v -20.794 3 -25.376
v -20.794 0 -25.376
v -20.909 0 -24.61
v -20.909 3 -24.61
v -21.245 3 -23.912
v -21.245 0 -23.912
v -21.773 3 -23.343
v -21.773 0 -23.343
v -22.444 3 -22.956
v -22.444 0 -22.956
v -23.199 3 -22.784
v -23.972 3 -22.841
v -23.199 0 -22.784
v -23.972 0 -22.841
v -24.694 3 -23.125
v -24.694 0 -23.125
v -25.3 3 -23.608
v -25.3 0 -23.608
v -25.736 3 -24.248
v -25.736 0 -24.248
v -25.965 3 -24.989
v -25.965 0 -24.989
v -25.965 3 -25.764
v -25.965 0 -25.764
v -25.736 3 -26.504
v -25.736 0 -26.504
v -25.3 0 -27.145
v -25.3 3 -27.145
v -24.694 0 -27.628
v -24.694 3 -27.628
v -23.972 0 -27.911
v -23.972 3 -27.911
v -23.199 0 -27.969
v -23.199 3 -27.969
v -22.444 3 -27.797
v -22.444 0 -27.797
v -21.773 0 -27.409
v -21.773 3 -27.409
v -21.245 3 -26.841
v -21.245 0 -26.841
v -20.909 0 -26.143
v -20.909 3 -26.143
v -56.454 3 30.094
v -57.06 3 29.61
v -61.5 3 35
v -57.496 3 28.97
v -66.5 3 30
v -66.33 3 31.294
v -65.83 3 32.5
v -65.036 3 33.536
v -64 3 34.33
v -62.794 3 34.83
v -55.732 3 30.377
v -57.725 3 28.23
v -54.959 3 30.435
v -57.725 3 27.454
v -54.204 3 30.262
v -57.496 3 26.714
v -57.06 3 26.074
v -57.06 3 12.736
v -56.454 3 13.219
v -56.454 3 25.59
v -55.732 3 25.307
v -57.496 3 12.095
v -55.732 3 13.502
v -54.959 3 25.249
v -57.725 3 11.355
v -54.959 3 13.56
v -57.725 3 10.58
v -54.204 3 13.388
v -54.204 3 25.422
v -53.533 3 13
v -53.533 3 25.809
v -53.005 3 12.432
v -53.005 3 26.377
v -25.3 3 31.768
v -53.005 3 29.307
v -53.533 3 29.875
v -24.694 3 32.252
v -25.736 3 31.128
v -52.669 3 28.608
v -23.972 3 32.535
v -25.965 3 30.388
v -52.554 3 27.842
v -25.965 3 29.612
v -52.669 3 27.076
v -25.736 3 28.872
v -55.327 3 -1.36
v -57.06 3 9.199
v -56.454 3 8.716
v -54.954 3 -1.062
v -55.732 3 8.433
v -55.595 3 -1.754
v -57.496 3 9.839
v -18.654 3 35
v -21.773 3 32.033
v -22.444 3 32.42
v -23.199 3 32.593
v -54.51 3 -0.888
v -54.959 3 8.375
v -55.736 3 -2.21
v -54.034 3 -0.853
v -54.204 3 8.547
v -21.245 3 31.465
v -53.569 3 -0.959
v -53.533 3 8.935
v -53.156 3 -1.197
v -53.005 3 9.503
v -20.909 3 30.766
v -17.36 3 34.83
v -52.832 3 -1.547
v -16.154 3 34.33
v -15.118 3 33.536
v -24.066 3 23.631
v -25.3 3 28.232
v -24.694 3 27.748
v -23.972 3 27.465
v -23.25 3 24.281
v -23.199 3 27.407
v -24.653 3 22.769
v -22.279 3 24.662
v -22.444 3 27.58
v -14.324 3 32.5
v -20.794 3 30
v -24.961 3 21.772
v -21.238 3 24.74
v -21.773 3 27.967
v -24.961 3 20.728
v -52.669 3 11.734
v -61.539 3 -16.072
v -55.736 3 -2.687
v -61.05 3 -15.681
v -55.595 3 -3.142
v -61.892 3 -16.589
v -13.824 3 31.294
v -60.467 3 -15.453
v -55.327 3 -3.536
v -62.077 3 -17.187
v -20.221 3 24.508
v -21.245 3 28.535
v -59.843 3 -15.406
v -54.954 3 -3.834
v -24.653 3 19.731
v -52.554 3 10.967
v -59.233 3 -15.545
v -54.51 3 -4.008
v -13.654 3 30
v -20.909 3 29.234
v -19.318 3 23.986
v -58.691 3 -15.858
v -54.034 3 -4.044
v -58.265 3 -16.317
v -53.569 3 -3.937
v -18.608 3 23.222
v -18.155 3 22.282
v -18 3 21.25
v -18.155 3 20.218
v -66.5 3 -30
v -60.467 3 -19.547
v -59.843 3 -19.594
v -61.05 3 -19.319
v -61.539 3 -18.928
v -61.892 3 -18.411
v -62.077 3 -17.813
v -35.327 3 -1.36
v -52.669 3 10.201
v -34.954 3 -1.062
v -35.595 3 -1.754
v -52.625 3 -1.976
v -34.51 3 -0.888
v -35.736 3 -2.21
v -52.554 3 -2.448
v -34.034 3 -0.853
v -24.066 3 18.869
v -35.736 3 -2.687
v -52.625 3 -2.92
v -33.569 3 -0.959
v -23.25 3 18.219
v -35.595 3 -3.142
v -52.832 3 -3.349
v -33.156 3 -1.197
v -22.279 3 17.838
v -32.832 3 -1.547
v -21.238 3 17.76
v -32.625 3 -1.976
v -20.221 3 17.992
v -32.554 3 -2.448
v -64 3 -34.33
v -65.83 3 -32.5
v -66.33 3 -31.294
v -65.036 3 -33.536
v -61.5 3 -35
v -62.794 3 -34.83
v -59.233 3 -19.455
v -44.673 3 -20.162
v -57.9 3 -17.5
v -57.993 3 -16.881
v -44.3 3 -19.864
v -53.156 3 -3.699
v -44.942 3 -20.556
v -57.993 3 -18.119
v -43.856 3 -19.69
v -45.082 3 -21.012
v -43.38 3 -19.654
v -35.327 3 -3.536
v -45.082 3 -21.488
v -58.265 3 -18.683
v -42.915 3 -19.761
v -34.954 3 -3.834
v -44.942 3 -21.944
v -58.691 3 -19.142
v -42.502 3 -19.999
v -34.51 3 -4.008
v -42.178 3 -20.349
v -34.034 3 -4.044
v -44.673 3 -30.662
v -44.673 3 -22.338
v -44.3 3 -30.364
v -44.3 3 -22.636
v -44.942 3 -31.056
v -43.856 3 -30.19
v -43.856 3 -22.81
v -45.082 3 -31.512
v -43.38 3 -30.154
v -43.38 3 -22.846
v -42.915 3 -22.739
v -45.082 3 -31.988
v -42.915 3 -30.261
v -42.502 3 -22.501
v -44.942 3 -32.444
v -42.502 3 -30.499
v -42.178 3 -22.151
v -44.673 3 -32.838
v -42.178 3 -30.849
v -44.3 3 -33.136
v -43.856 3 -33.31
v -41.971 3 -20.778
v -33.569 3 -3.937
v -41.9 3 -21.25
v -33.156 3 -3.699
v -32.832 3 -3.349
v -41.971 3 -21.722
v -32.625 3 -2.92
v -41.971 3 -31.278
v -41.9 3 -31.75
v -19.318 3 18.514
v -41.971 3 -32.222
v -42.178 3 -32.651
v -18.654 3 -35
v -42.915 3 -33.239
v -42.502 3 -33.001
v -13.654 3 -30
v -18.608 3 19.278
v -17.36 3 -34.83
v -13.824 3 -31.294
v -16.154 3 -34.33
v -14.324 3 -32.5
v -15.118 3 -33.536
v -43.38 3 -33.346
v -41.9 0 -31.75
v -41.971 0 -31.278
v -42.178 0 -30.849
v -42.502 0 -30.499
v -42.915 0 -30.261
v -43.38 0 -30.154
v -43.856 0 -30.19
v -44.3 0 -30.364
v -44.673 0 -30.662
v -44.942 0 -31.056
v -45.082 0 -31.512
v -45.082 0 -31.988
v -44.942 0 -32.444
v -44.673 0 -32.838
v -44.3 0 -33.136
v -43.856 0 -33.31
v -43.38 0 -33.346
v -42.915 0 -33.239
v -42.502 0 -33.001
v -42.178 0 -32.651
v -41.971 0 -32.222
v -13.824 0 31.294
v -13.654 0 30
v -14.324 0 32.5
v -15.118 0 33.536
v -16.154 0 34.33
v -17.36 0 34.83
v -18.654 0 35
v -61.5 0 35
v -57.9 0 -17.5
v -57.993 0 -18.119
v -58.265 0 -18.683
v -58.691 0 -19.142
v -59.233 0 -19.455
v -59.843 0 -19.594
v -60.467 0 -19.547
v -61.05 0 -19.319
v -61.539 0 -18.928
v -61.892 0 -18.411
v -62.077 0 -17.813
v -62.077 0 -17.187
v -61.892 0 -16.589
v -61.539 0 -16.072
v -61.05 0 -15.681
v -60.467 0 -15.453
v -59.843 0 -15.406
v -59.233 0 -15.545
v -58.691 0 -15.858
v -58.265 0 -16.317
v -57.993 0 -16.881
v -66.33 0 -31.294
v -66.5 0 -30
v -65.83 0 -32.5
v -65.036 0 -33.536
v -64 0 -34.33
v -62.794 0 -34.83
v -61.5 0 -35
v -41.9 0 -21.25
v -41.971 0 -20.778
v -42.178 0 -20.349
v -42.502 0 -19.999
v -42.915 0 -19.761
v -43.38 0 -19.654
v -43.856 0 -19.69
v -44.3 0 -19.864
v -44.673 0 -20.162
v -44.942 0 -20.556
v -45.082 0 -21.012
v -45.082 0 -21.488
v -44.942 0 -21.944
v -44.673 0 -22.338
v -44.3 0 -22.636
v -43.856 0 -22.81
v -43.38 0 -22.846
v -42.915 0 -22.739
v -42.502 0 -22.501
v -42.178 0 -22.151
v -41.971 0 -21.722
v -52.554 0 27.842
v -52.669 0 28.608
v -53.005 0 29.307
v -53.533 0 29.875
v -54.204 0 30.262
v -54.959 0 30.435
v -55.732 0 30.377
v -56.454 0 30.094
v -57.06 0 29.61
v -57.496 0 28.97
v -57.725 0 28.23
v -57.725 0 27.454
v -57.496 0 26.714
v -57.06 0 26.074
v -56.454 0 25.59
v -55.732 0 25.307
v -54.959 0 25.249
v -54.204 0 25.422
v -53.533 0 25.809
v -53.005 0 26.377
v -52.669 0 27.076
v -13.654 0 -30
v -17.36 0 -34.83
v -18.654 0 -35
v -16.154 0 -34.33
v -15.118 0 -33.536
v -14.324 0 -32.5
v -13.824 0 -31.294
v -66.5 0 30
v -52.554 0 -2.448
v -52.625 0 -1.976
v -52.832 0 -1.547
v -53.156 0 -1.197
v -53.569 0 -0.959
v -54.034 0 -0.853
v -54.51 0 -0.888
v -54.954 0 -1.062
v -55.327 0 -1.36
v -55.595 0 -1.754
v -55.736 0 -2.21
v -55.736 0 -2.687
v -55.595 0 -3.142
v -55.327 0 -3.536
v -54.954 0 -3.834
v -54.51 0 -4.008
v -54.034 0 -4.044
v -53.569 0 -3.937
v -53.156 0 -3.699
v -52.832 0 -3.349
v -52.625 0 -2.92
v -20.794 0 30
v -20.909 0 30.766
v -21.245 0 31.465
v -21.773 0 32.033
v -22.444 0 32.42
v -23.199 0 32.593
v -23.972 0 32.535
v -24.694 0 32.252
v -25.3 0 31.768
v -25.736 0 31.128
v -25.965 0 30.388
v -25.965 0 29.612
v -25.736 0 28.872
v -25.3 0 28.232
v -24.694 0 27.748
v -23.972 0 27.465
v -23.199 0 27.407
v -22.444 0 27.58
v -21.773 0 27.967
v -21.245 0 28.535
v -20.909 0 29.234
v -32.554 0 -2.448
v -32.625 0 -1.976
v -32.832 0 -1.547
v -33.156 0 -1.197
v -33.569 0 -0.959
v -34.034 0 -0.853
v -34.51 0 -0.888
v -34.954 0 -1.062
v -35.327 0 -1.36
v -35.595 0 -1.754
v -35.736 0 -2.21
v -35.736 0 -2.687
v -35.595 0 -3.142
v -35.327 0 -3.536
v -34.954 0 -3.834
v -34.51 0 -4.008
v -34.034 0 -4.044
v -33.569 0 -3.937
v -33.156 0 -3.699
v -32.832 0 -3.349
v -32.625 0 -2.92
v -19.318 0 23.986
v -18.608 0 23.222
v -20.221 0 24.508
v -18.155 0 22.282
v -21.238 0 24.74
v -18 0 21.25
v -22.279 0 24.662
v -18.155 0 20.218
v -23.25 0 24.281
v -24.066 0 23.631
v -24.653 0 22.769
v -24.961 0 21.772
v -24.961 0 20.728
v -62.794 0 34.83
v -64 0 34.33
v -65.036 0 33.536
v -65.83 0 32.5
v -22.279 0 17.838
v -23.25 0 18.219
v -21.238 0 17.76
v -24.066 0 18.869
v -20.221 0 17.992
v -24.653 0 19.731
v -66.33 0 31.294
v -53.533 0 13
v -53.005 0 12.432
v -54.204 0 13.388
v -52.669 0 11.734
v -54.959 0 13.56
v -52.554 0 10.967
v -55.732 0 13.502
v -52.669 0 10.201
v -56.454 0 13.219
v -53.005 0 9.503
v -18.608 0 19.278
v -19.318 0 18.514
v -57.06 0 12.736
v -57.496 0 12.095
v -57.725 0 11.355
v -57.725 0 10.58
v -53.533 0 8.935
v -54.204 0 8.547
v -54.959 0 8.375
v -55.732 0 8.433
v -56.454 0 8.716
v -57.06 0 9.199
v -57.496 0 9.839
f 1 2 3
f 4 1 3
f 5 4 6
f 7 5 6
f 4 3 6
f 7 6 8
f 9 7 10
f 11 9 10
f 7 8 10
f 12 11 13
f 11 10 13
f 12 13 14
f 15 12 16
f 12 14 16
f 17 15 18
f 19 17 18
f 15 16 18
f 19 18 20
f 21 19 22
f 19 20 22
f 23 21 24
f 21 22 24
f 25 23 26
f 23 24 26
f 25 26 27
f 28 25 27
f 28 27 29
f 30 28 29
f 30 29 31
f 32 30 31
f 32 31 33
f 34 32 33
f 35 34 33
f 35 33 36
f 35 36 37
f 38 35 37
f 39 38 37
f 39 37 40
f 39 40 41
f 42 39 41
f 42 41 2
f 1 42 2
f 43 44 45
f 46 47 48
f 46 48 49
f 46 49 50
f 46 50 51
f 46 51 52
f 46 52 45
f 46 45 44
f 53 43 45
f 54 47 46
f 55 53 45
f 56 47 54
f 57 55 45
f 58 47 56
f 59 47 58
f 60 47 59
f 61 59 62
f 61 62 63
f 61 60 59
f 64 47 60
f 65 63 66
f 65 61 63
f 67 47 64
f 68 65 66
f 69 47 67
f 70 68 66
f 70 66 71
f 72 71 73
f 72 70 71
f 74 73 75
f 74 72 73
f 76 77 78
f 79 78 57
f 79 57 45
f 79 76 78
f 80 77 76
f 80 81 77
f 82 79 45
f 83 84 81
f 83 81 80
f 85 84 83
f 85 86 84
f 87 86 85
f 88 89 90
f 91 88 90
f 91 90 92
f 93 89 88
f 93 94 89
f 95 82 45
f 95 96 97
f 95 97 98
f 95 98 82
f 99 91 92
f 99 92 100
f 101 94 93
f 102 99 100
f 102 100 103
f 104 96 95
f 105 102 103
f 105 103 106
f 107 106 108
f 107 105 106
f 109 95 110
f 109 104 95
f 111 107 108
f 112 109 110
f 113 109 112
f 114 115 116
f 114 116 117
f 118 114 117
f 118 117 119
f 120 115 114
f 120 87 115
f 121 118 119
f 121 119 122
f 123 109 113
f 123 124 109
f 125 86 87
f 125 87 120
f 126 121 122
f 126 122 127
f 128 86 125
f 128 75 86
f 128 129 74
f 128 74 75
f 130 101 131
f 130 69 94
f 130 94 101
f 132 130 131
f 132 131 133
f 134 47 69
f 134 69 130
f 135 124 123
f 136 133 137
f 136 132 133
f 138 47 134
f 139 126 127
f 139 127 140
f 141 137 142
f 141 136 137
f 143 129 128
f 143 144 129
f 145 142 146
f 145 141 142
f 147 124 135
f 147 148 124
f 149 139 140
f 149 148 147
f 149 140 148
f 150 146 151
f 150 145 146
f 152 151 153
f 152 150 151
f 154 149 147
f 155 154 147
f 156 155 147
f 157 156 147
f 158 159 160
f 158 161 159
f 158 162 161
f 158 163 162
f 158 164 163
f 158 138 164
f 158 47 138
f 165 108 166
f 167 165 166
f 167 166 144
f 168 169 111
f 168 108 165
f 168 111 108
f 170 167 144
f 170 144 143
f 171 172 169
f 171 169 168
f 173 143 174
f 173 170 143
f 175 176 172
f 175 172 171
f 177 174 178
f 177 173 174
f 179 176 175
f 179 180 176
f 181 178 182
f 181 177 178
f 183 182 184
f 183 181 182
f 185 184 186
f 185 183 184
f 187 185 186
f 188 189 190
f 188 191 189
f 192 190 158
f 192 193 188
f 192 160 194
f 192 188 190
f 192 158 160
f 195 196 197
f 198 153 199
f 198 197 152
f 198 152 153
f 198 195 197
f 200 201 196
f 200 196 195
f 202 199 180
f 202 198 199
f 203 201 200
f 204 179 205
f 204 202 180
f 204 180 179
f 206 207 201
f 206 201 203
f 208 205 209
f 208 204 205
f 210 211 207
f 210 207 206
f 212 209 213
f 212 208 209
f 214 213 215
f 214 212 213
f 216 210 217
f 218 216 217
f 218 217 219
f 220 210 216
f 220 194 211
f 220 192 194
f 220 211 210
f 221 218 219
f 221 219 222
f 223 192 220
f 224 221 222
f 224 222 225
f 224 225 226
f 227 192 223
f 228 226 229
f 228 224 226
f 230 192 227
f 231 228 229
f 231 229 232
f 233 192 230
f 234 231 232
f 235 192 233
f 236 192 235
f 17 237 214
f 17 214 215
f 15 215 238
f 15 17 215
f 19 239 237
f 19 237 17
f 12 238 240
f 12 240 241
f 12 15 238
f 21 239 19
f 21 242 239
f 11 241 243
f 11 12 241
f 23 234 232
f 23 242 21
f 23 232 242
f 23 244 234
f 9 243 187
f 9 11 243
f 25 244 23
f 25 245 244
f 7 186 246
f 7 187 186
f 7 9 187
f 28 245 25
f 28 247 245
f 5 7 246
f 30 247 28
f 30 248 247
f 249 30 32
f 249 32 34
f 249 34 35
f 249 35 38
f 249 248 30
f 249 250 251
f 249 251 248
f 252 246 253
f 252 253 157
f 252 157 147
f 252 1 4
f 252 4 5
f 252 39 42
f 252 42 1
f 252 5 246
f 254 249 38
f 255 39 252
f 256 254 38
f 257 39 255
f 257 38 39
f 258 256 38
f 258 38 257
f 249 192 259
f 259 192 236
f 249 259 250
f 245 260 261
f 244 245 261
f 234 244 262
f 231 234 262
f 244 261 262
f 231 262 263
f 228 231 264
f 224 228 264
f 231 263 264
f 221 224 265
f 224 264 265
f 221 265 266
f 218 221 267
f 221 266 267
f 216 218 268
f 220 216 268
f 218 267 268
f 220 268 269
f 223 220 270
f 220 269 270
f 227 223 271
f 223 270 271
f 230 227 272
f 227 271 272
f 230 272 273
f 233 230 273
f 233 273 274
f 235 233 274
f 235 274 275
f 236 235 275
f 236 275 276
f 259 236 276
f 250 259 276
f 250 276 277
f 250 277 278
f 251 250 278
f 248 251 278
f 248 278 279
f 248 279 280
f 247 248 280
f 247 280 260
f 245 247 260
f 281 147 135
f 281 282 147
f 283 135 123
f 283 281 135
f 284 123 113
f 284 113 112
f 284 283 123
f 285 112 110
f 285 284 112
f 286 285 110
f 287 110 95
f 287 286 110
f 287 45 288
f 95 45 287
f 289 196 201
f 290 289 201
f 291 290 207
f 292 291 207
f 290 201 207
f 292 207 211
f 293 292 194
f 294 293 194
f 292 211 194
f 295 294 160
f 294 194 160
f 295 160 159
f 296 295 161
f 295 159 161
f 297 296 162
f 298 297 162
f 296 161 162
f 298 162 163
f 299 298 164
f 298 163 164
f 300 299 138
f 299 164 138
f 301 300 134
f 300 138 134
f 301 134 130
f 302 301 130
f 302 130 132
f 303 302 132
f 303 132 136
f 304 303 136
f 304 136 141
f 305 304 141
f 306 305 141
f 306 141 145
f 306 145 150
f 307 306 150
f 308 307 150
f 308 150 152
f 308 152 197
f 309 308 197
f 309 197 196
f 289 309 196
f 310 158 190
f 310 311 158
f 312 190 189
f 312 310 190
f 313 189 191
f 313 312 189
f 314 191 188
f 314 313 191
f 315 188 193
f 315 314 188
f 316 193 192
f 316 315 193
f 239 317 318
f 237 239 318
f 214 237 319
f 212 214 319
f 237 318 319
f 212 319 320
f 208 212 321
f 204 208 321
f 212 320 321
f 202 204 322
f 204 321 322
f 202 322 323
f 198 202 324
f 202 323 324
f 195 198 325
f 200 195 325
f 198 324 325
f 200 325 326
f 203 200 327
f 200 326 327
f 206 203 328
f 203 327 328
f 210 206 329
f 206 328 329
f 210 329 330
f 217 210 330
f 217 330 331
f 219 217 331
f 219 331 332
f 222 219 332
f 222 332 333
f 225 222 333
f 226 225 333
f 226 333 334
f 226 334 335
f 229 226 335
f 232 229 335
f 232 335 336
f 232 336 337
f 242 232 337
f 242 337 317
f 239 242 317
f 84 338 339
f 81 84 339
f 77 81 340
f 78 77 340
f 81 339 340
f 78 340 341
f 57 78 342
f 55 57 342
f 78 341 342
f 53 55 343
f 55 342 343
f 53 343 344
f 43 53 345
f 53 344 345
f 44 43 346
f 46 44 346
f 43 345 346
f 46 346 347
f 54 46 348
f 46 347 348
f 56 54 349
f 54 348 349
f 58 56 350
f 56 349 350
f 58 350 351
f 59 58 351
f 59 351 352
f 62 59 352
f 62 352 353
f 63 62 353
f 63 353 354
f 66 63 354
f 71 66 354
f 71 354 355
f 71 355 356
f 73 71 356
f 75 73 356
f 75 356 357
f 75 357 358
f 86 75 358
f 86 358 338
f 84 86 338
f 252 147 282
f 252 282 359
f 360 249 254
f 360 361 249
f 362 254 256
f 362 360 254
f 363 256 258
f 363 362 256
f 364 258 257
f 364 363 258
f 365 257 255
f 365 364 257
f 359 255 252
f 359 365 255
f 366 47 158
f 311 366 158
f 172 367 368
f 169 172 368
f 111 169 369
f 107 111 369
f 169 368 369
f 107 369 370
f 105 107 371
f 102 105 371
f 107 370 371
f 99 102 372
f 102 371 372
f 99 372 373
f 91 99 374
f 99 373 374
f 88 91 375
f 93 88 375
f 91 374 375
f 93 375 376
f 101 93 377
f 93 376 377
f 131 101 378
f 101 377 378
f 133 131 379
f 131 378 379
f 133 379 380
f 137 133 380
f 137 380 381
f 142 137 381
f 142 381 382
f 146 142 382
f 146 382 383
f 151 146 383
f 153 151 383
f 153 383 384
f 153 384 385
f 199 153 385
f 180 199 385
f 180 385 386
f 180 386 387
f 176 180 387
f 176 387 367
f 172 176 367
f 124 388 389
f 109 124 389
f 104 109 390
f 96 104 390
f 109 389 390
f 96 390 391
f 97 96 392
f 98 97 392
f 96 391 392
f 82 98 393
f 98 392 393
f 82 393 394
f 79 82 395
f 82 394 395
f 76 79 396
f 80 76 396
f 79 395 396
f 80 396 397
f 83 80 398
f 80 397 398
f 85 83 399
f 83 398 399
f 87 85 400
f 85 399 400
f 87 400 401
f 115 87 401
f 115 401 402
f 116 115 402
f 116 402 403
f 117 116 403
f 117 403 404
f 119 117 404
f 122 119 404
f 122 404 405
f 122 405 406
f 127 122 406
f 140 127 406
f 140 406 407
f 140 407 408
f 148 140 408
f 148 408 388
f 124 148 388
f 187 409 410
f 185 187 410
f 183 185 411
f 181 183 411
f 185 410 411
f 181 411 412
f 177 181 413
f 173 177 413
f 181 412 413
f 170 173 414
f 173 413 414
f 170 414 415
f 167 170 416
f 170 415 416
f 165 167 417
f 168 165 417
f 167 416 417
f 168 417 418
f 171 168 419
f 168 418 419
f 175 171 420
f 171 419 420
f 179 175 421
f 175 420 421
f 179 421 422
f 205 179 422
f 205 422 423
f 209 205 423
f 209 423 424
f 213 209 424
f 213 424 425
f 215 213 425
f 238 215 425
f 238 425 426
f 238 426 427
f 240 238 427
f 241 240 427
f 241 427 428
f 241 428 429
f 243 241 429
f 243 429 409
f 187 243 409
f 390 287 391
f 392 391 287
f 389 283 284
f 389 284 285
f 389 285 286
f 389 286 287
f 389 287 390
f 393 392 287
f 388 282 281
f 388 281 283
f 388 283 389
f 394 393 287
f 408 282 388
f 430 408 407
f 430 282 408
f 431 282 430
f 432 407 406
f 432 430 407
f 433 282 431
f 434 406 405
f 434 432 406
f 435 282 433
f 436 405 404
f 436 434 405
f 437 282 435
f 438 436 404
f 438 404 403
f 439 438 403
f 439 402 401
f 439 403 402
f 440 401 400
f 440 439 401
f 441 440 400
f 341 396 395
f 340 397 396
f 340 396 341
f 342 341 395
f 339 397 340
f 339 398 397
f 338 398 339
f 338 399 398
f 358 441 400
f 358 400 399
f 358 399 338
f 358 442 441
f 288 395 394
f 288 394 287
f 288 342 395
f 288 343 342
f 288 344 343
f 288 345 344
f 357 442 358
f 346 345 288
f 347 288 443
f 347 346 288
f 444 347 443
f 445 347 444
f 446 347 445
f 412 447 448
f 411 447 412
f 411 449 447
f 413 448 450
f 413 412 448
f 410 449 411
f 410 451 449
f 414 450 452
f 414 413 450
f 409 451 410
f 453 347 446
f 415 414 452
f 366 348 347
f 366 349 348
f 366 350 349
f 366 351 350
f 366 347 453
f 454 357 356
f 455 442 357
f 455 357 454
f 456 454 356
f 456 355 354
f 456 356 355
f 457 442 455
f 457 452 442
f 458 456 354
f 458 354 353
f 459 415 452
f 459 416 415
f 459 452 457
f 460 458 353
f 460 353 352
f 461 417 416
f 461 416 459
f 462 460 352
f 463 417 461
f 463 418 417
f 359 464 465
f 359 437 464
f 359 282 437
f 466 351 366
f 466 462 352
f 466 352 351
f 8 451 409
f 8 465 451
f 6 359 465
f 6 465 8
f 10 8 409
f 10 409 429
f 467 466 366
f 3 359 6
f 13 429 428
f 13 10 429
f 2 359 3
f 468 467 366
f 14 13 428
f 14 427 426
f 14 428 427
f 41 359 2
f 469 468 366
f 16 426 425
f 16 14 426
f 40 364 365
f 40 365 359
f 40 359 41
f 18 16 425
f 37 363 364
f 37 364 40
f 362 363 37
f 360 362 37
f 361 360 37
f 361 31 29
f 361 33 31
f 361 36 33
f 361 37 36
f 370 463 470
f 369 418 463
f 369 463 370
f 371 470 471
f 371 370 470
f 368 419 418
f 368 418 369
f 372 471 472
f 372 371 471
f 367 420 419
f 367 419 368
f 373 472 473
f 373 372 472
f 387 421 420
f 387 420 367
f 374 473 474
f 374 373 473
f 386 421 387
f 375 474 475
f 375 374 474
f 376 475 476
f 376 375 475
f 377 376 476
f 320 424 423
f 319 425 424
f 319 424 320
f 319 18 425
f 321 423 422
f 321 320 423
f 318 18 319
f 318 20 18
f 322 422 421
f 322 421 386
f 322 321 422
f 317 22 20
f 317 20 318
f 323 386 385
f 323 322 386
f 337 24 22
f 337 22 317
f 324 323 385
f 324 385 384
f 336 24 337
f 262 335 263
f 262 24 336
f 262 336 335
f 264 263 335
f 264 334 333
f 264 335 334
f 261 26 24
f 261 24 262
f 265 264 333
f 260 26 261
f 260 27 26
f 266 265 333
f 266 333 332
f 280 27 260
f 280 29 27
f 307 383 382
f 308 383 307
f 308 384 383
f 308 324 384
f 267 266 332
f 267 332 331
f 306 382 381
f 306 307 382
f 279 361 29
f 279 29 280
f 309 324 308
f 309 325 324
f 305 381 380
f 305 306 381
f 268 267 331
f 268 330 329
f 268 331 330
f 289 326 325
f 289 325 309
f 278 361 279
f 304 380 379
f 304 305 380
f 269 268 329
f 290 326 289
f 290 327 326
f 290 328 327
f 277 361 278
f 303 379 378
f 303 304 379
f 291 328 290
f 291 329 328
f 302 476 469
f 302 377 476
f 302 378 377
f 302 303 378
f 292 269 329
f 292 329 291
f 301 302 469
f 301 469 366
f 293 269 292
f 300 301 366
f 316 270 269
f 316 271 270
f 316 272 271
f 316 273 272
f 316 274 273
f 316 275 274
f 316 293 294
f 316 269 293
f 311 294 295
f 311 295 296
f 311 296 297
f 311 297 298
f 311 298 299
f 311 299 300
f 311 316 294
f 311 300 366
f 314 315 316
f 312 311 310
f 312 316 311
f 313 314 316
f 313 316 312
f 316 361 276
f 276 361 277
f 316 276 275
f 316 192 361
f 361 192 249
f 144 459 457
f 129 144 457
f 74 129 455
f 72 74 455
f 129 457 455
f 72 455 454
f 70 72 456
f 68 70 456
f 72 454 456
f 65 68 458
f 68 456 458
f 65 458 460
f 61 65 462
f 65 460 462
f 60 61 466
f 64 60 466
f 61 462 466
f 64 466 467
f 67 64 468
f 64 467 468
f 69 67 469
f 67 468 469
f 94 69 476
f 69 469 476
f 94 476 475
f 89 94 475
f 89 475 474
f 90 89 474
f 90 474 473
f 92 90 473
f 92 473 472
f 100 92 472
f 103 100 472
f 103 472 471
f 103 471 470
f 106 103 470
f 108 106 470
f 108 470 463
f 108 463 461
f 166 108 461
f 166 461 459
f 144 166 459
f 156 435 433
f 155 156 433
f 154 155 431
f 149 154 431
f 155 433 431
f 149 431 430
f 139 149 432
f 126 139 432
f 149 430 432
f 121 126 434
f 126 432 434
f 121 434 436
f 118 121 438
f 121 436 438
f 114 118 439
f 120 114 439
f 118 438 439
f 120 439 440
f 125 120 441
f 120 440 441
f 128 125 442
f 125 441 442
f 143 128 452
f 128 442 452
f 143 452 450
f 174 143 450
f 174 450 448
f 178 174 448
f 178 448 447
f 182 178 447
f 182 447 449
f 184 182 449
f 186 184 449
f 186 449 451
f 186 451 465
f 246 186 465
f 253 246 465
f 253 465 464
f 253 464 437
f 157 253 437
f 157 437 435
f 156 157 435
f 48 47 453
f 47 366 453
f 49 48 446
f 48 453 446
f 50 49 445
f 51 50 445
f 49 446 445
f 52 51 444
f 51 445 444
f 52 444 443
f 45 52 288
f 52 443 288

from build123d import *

# Parameters (mm, degrees)
SKETCH_1_W             = 35
SKETCH_1_H             = 70
SKETCH_1_R             = 2.6
EXTRUDE_505_DEPTH      = 3
SKETCH_2_R             = 2.1
CUT_EXTRUDE_M4_DEPTH   = 3
SKETCH_3_R             = 2.6
EXTRUDE_967_DEPTH      = 3
SKETCH_4_R             = 2.1
CUT_EXTRUDE_1312_DEPTH = 4
SKETCH_5_W             = 49
SKETCH_5_H             = 70
EXTRA_DEPTH            = 3
SKETCH_6_R             = 2.1
CUT_EXTRUDE_2055_DEPTH = 10
SKETCH_7_R             = 2.1
ETRA_DEPTH             = 10
SKETCH_10_R            = 1.6
SKETCH_10_R_2          = 3.5
CUT_EXTRUDE_3548_DEPTH = 4
FILLET_5_0_R           = 5
SKETCH_12_R            = 2.1
EXTRUDE_1_DEPTH        = 3
SKETCH_13_R            = 1.5
CUT_EXTRUDE_1_DEPTH    = 4
SKETCH_15_W            = 32.658399477
SKETCH_15_H            = 70
CUT_EXTRUDE_4_DEPTH    = 4
FILLET_6_R             = 5
SKETCH_16_R            = 1.6
SKETCH_16_R_2          = 1.603432059
EXTRUDE_2_DEPTH        = 3
SKETCH_17_R            = 2.5
CUT_EXTRUDE_5_DEPTH    = 4
SKETCH_18_R            = 1.5
EXTRUDE_3_DEPTH        = 3
SKETCH_19_R            = 1.2
CUT_EXTRUDE_6_DEPTH    = 4
SKETCH_20_R            = 2.1
SKETCH_20_R_2          = 1.6
SKETCH_20_R_3          = 2.55820294
EXTRUDE_4_DEPTH        = 3
SKETCH_22_R            = 3.5
SKETCH_22_R_2          = 2.5
EXTRUDE_5_DEPTH        = 3
SKETCH_25_R            = 2.5
CUT_EXTRUDE_9_DEPTH    = 4
SKETCH_26_R            = 2.6
SKETCH_26_R_2          = 1.6
CUT_EXTRUDE_10_DEPTH   = 4


with BuildPart() as part:
    # 草图1 → Extrude 505 (new body)
    with BuildSketch(Plane(origin=(0, 0, 0), x_dir=(1, 0, 0), z_dir=(0, 1, 0))):
        Rectangle(SKETCH_1_W, SKETCH_1_H)
        with Locations((-7.5, 22.5)):
            Circle(SKETCH_1_R, mode=Mode.SUBTRACT)
        with Locations((-7.5, 0)):
            Circle(SKETCH_1_R, mode=Mode.SUBTRACT)
        with Locations((-7.5, -22.5)):
            Circle(SKETCH_1_R, mode=Mode.SUBTRACT)
        with Locations((-7.5, 10)):
            Circle(SKETCH_1_R, mode=Mode.SUBTRACT)
        with Locations((-7.5, -10)):
            Circle(SKETCH_1_R, mode=Mode.SUBTRACT)
    extrude(amount=EXTRUDE_505_DEPTH)

    # 草图2 → M4铝柱 (cut)
    with BuildSketch(Plane(origin=(0, 3, 0), x_dir=(1, 0, 0), z_dir=(0, 1, 0))):
        with Locations((10, 0)):
            Circle(SKETCH_2_R)
    extrude(amount=-CUT_EXTRUDE_M4_DEPTH, mode=Mode.SUBTRACT)

    # 草图3 → Extrude 967 (add, through all)
    with BuildSketch(Plane(origin=(0, 3, 0), x_dir=(1, 0, 0), z_dir=(0, 1, 0))):
        with Locations((-7.5, -10)):
            Circle(SKETCH_3_R)
        with Locations((-7.5, 10)):
            Circle(SKETCH_3_R)
    extrude(amount=-EXTRUDE_967_DEPTH)

    # 草图4 → Cut-Extrude 1312 (cut, through all)
    with BuildSketch(Plane(origin=(0, 3, 0), x_dir=(1, 0, 0), z_dir=(0, 1, 0))):
        with Locations((10, 22.5)):
            Circle(SKETCH_4_R)
        with Locations((10, -22.5)):
            Circle(SKETCH_4_R)
    extrude(amount=-CUT_EXTRUDE_1312_DEPTH, mode=Mode.SUBTRACT)

    # 草图5 → EXTRA (add, through all)
    with BuildSketch(Plane(origin=(0, 3, 0), x_dir=(1, 0, 0), z_dir=(0, 1, 0))):
        with Locations((-42, 0)):
            Rectangle(SKETCH_5_W, SKETCH_5_H)
    extrude(amount=-EXTRA_DEPTH)

    # 草图6 → Cut-Extrude 2055 (cut)
    with BuildSketch(Plane(origin=(0, 3, 0), x_dir=(1, 0, 0), z_dir=(0, 1, 0))):
        with Locations((-44.5, 0)):
            Circle(SKETCH_6_R)
        with Locations((-36.5, 0)):
            Circle(SKETCH_6_R)
    extrude(amount=-CUT_EXTRUDE_2055_DEPTH, mode=Mode.SUBTRACT)

    # 草图7 → ETRA铝柱 (cut)
    with BuildSketch(Plane(origin=(0, 3, 0), x_dir=(1, 0, 0), z_dir=(0, 1, 0))):
        with Locations((-60, 17.5)):
            Circle(SKETCH_7_R)
        with Locations((-60, -17.5)):
            Circle(SKETCH_7_R)
    extrude(amount=-ETRA_DEPTH, mode=Mode.SUBTRACT)

    # 草图10 → Cut-Extrude 3548 (cut, through all)
    with BuildSketch(Plane.XZ):
        with Locations((-43.5, -21.25)):
            Circle(SKETCH_10_R)
        with Locations((-21.5, -31.75)):
            Circle(SKETCH_10_R)
        with Locations((-43.5, -31.75)):
            Circle(SKETCH_10_R)
        with Locations((-43.5, 21.25)):
            Circle(SKETCH_10_R)
        with Locations((-21.5, 31.75)):
            Circle(SKETCH_10_R)
        with Locations((-43.5, 31.75)):
            Circle(SKETCH_10_R)
        with Locations((-21.5, 21.25)):
            Circle(SKETCH_10_R_2)
        with Locations((-21.5, -21.25)):
            Circle(SKETCH_10_R_2)
    extrude(amount=-CUT_EXTRUDE_3548_DEPTH, mode=Mode.SUBTRACT)

    # 圆角5.0
    fillet_5_0_edges = [part.edges().sort_by_distance(p)[0] for p in [
        (-66.5, 1.5, 35),
        (-66.5, 1.5, -35),
        (17.5, 1.5, 35),
        (17.5, 1.5, -35),
    ]]
    fillet(fillet_5_0_edges, radius=FILLET_5_0_R)

    # 草图12 → 凸台-拉伸1 (add)
    with BuildSketch(Plane(origin=(0, 3, 0), x_dir=(1, 0, 0), z_dir=(0, 1, 0))):
        with Locations((-36.5, 0)):
            Circle(SKETCH_12_R)
        with Locations((-44.5, 0)):
            Circle(SKETCH_12_R)
    extrude(amount=-EXTRUDE_1_DEPTH)

    # 草图13 → 切除-拉伸1 (cut, through all)
    with BuildSketch(Plane(origin=(0, 3, 0), x_dir=(1, 0, 0), z_dir=(0, 1, 0))):
        with Locations((-52.499999555, 1.426e-06)):
            Circle(SKETCH_13_R)
        with Locations((-28.499999555, 1.44e-06)):
            Circle(SKETCH_13_R)
    extrude(amount=-CUT_EXTRUDE_1_DEPTH, mode=Mode.SUBTRACT)

    # 草图15 → 切除-拉伸4 (cut, through all)
    with BuildSketch(Plane(origin=(0, 3, 0), x_dir=(1, 0, 0), z_dir=(0, 1, 0))):
        with Locations((2.675548589, 0)):
            Rectangle(SKETCH_15_W, SKETCH_15_H)
    extrude(amount=-CUT_EXTRUDE_4_DEPTH, mode=Mode.SUBTRACT)

    # 圆角6
    fillet_6_edges = [part.edges().sort_by_distance(p)[0] for p in [
        (-13.653651149, 1.5, -35),
        (-13.653651149, 1.5, 35),
    ]]
    fillet(fillet_6_edges, radius=FILLET_6_R)

    # 草图16 → 凸台-拉伸2 (add)
    with BuildSketch(Plane.XZ):
        with Locations((-21.5, 31.75)):
            Circle(SKETCH_16_R)
        with Locations((-21.5, -31.75)):
            Circle(SKETCH_16_R_2)
    extrude(amount=-EXTRUDE_2_DEPTH)

    # 草图17 → 切除-拉伸5 (cut, through all)
    with BuildSketch(Plane(origin=(0, 3, 0), x_dir=(1, 0, 0), z_dir=(0, 1, 0))):
        with Locations((-23.393651149, -30)):
            Circle(SKETCH_17_R)
        with Locations((-24.763651149, 30)):
            Circle(SKETCH_17_R)
    extrude(amount=-CUT_EXTRUDE_5_DEPTH, mode=Mode.SUBTRACT)

    # 草图18 → 凸台-拉伸3 (add)
    with BuildSketch(Plane.XZ):
        with Locations((-52.499999555, -1.426e-06)):
            Circle(SKETCH_18_R)
        with Locations((-28.499999555, -1.44e-06)):
            Circle(SKETCH_18_R)
    extrude(amount=-EXTRUDE_3_DEPTH)

    # 草图19 → 切除-拉伸6 (cut, through all)
    with BuildSketch(Plane.XZ):
        with Locations((-54.153651149, -2.448052536)):
            Circle(SKETCH_19_R)
        with Locations((-34.153651149, -2.448052536)):
            Circle(SKETCH_19_R)
    extrude(amount=-CUT_EXTRUDE_6_DEPTH, mode=Mode.SUBTRACT)

    # 草图20 → 凸台-拉伸4 (add)
    with BuildSketch(Plane.XZ):
        with Locations((-60, 17.5)):
            Circle(SKETCH_20_R)
        with Locations((-43.5, 21.25)):
            Circle(SKETCH_20_R_2)
        with Locations((-43.653651149, 31.685692809)):
            Circle(SKETCH_20_R_3)
    extrude(amount=-EXTRUDE_4_DEPTH)

    # 草图22 → 凸台-拉伸5 (add)
    with BuildSketch(Plane(origin=(0, 0, 0), x_dir=(-1, 0, 0), z_dir=(0, -1, 0))):
        with Locations((21.5, 21.25)):
            Circle(SKETCH_22_R)
        with Locations((24.763651149, 30)):
            Circle(SKETCH_22_R_2)
    extrude(amount=-EXTRUDE_5_DEPTH)

    # 草图25 → 切除-拉伸9 (cut, through all)
    with BuildSketch(Plane(origin=(0, 3, 0), x_dir=(1, 0, 0), z_dir=(0, 1, 0))):
        with Locations((-23.393651149, 25.376236088)):
            Circle(SKETCH_25_R)
    extrude(amount=-CUT_EXTRUDE_9_DEPTH, mode=Mode.SUBTRACT)

    # 草图26 → 切除-拉伸10 (cut, through all)
    with BuildSketch(Plane.XZ):
        with Locations((-55.153651029, 27.841992404)):
            Circle(SKETCH_26_R)
        with Locations((-23.393651149, -25.376236088)):
            Circle(SKETCH_26_R)
        with Locations((-23.393651149, 30)):
            Circle(SKETCH_26_R)
        with Locations((-55.153651029, 10.96736207)):
            Circle(SKETCH_26_R)
        with Locations((-54.153651149, -2.448052536)):
            Circle(SKETCH_26_R_2)
        with Locations((-34.153651149, -2.448052536)):
            Circle(SKETCH_26_R_2)
    extrude(amount=-CUT_EXTRUDE_10_DEPTH, mode=Mode.SUBTRACT)


solid = part.part
